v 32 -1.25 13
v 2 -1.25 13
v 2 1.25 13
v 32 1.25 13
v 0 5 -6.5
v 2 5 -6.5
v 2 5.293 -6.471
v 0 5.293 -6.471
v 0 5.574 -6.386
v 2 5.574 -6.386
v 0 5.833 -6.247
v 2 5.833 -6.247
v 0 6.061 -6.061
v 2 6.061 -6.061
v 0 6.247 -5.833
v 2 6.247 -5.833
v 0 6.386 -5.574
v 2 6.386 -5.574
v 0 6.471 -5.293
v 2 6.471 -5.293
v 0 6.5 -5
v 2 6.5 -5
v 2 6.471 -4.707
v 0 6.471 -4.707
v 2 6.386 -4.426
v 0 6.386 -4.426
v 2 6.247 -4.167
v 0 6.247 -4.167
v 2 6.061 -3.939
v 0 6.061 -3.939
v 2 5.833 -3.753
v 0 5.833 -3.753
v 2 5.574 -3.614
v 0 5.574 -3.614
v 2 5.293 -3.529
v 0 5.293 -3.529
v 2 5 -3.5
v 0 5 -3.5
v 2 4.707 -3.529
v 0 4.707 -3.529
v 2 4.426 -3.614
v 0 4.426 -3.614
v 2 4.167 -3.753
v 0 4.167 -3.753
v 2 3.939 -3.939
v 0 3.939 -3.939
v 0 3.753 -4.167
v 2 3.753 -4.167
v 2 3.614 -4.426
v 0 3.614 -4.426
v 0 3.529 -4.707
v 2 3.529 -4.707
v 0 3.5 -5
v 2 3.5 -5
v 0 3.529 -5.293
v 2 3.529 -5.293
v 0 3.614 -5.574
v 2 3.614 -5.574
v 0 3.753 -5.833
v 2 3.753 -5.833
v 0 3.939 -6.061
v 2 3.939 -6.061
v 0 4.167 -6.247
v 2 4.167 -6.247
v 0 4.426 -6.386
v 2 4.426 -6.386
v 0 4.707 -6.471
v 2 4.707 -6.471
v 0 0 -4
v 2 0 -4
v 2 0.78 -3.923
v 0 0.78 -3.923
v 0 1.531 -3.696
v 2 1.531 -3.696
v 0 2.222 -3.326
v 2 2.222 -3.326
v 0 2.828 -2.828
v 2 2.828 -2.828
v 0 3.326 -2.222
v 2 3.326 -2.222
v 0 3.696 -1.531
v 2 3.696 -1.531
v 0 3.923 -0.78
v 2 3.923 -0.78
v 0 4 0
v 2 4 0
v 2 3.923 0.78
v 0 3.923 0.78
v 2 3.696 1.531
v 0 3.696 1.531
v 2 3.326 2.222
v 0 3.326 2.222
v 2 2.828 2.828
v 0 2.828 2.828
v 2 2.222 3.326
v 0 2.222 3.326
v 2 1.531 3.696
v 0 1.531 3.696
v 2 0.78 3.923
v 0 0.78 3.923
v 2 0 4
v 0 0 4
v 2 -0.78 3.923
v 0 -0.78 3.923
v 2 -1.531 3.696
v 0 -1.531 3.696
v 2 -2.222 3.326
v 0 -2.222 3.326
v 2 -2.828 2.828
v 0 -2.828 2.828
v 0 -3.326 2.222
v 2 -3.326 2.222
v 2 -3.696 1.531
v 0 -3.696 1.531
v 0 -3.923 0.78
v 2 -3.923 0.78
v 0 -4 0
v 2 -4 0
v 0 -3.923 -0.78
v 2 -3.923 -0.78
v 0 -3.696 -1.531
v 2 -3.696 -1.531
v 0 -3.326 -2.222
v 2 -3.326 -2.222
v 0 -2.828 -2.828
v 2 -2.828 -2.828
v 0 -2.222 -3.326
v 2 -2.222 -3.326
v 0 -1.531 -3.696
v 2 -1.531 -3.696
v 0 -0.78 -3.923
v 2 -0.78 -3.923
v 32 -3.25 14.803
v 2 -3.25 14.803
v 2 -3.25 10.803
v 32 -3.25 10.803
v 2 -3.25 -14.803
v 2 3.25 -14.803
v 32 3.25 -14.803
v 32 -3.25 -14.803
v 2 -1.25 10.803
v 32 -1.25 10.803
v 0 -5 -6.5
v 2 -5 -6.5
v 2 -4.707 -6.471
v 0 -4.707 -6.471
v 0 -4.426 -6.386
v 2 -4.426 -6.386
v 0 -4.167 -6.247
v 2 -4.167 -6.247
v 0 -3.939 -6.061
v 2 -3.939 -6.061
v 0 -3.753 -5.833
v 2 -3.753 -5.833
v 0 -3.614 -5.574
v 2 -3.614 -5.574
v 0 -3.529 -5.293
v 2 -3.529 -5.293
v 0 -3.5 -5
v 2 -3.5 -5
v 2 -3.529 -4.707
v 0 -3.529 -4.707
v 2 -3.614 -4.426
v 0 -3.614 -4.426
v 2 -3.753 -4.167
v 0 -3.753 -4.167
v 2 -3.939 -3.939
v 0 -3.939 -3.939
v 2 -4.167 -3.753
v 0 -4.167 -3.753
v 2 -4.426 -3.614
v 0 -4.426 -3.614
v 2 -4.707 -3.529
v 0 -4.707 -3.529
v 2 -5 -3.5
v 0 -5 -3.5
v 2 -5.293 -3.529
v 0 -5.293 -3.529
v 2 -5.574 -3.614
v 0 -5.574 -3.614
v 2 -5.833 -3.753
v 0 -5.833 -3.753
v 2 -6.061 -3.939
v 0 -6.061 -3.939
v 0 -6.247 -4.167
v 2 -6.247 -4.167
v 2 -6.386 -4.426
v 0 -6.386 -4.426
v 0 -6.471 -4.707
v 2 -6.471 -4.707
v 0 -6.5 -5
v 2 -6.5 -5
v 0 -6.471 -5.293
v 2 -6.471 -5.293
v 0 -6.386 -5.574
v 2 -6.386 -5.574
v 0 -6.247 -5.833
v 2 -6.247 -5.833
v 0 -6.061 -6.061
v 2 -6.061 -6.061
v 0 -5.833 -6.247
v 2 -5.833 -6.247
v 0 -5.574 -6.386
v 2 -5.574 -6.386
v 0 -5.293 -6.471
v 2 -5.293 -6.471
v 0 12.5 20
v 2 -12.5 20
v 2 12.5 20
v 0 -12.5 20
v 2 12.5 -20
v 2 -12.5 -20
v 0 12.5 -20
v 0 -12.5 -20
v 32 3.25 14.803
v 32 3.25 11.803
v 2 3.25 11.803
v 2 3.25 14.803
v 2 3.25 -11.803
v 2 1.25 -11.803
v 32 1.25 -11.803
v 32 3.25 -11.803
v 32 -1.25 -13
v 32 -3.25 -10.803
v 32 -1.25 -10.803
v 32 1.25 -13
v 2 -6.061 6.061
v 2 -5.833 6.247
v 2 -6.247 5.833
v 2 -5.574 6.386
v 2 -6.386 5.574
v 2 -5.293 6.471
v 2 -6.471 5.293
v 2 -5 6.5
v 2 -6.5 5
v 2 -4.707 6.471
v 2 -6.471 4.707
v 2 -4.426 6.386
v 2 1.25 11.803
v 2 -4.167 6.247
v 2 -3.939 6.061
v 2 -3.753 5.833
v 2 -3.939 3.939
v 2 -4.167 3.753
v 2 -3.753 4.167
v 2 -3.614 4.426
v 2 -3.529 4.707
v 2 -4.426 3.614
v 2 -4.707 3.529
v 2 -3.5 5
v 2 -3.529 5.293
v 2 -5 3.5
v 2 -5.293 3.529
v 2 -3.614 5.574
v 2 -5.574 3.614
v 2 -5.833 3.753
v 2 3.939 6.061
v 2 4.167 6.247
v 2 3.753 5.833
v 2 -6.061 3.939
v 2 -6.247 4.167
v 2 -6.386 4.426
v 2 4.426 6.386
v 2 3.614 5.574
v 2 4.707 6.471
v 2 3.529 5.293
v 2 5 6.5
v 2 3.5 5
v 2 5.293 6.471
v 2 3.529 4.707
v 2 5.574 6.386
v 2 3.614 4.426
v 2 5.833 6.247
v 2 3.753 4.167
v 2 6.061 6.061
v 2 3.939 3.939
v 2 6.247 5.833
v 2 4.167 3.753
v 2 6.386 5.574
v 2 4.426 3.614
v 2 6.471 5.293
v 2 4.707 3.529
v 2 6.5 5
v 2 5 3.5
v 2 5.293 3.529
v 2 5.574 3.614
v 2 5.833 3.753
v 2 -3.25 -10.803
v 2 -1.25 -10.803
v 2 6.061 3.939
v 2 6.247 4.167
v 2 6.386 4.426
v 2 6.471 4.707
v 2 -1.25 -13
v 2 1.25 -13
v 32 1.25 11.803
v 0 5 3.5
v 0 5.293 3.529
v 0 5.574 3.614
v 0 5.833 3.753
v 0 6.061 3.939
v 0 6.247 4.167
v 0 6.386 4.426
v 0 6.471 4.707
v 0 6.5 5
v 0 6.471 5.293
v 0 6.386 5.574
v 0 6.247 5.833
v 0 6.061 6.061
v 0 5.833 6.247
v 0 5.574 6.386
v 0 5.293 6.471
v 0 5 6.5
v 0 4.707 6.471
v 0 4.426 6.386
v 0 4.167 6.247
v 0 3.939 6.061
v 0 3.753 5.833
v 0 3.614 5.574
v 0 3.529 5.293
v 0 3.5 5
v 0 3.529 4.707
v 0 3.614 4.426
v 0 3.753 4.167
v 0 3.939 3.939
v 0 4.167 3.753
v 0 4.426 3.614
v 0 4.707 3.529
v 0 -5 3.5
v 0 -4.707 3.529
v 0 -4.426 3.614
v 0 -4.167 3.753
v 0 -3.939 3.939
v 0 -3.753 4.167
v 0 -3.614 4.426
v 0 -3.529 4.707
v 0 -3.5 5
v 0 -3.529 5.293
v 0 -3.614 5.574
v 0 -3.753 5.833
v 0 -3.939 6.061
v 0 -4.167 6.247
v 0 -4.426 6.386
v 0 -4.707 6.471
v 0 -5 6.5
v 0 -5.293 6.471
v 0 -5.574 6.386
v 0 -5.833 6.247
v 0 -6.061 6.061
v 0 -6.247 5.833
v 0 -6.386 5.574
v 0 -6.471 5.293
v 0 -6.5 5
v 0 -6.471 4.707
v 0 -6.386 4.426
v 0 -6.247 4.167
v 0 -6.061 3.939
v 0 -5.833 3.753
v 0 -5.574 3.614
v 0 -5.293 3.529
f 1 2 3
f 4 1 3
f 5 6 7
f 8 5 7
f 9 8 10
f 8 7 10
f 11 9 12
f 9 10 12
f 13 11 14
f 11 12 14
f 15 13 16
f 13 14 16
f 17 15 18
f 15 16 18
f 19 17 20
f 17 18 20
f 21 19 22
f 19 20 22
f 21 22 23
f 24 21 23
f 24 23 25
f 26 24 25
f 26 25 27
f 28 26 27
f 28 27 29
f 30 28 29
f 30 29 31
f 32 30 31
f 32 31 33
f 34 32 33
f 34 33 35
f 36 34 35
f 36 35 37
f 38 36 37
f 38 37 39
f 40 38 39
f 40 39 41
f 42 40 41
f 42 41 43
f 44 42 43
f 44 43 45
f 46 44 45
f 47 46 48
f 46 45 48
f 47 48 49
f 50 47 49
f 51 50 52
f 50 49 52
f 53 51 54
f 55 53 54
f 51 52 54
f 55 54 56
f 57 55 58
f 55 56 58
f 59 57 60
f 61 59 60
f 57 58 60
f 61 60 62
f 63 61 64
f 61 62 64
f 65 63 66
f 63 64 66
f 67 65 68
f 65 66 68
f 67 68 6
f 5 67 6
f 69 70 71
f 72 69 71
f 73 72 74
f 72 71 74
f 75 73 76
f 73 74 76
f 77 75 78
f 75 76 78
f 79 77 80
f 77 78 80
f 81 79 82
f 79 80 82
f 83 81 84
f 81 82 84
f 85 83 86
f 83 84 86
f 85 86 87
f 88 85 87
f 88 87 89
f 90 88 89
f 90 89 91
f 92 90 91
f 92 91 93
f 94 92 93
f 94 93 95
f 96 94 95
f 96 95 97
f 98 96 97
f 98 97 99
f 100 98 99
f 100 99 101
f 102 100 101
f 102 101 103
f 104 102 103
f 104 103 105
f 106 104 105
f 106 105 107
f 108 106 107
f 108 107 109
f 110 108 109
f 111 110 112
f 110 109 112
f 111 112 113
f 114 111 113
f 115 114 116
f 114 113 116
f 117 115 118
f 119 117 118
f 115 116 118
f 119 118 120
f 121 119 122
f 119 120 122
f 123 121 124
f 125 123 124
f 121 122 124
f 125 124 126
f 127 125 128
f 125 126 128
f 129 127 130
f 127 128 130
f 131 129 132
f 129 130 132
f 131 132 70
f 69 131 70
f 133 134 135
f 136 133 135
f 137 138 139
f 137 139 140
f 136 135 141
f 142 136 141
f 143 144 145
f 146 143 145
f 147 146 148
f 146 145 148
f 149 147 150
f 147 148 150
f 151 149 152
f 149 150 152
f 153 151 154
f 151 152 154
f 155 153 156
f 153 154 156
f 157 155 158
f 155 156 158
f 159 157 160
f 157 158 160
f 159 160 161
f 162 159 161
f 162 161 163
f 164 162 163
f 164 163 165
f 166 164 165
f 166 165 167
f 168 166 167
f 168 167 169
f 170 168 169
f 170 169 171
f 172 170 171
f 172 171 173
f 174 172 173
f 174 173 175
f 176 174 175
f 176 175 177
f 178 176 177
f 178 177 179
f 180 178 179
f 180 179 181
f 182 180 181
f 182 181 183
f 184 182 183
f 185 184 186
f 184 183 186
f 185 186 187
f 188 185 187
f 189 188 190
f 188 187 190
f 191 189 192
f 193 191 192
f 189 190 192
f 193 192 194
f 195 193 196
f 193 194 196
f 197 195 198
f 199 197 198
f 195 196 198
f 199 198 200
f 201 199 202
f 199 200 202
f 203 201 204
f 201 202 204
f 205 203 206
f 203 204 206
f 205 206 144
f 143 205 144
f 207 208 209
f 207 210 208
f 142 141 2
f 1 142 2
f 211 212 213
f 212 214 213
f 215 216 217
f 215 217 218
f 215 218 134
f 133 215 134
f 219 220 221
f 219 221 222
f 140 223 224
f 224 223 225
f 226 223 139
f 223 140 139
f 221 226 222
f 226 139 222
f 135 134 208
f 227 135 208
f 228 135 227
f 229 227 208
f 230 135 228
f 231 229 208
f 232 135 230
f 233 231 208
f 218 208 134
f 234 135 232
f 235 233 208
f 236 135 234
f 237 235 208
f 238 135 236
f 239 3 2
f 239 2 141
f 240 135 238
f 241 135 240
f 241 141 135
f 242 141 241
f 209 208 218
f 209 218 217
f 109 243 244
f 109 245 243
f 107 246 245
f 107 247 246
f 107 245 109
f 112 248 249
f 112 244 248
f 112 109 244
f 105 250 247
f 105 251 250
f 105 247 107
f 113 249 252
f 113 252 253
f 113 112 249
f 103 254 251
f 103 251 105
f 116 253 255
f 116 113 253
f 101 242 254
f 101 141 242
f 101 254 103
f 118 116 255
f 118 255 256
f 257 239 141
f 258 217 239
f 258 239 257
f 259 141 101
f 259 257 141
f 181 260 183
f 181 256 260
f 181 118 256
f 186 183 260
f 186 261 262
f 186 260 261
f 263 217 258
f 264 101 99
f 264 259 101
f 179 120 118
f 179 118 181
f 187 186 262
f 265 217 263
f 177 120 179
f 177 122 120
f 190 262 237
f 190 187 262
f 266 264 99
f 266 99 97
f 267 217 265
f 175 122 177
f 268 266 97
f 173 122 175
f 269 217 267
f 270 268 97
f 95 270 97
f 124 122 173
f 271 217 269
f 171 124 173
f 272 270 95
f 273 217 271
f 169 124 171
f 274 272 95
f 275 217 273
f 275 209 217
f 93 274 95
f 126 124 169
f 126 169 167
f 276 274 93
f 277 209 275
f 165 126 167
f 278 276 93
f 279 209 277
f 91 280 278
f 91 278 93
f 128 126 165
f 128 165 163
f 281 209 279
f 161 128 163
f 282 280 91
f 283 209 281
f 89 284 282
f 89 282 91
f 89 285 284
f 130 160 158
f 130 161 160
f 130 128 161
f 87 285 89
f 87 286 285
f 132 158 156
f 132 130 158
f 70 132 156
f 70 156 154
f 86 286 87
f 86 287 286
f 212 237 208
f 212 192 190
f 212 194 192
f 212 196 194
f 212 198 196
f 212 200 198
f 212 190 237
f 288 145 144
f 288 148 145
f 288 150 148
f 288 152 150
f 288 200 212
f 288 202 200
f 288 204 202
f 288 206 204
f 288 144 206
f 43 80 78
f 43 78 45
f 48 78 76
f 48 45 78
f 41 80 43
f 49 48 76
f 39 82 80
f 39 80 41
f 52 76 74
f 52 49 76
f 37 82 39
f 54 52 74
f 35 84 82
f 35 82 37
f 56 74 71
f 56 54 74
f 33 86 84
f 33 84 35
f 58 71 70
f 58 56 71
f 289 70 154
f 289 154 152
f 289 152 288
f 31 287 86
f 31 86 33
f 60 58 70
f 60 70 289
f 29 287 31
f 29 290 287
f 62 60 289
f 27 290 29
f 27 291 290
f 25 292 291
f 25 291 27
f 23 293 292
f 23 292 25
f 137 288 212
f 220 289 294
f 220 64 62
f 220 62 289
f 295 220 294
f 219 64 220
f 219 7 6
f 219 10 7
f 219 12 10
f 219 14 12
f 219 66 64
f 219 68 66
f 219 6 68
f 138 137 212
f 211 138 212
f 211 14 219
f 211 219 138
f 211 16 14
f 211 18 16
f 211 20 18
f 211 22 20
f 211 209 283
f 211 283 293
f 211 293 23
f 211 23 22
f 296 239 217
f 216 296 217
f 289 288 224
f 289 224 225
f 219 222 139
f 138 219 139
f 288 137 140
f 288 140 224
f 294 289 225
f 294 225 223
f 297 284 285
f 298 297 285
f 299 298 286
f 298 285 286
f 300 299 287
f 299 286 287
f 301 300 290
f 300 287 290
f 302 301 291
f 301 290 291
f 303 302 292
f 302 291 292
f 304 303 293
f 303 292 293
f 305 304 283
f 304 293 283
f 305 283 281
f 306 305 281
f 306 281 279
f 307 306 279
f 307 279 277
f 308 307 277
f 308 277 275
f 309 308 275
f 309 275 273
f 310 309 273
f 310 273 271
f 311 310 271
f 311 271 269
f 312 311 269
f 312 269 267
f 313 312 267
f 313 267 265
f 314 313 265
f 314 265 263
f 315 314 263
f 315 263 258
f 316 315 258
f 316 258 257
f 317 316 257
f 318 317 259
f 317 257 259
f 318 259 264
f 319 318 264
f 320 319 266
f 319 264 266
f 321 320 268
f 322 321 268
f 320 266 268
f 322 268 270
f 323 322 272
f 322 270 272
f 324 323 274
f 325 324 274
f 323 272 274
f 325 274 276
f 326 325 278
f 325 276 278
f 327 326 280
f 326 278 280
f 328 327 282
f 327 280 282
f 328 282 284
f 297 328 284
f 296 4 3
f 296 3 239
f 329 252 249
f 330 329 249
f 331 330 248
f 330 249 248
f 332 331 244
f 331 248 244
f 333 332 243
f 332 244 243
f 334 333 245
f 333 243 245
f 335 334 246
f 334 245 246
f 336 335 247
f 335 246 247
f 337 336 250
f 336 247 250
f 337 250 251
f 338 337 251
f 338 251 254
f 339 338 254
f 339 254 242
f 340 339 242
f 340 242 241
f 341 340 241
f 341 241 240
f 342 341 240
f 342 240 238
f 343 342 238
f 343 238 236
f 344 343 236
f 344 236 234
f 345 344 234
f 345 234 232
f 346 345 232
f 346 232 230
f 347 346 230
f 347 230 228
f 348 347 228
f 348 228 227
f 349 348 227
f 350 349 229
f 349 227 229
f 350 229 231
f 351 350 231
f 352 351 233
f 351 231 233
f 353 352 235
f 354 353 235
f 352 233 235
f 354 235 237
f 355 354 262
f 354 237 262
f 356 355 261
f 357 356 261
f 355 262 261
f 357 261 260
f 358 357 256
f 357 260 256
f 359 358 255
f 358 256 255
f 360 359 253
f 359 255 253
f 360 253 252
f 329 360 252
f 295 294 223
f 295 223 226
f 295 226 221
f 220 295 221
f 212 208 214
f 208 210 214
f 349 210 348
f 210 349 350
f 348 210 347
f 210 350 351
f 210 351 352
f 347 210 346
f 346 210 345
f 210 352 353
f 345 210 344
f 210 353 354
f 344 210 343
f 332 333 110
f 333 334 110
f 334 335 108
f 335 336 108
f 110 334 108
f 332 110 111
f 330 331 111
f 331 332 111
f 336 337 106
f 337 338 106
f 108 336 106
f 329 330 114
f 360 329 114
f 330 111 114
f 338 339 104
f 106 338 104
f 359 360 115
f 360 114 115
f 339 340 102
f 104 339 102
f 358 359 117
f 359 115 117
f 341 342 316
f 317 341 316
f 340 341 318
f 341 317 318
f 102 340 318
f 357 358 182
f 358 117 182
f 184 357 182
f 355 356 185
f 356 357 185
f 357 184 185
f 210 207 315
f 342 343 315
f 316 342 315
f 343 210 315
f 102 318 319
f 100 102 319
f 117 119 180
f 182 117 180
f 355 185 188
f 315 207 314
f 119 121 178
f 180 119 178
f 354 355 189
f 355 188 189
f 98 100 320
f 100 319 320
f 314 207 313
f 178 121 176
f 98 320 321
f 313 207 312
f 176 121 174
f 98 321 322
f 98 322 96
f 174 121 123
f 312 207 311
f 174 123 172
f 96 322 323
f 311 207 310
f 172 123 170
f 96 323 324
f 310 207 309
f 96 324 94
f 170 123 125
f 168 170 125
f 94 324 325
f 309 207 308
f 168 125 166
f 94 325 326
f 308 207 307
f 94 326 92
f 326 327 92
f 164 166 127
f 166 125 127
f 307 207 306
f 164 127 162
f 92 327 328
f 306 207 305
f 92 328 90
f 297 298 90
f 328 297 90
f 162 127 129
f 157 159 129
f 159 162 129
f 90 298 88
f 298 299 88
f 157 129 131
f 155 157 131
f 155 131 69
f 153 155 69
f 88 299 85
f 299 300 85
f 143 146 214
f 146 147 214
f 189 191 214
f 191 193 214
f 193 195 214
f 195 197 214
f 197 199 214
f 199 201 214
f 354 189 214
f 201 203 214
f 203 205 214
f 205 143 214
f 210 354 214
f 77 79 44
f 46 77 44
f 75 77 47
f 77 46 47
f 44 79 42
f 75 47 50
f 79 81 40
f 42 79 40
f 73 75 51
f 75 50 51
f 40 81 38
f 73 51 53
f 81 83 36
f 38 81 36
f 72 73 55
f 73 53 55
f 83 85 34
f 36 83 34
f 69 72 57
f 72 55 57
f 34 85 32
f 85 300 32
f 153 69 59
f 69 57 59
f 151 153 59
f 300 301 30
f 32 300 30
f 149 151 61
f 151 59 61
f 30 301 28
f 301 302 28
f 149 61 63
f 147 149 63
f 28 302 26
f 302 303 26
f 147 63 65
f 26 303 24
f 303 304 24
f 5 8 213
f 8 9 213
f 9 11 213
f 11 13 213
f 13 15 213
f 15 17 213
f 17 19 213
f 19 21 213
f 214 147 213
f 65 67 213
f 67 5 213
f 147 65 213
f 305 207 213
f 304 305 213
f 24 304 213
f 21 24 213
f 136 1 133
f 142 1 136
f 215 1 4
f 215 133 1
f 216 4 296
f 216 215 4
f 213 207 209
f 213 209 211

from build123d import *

# Parameters (mm, degrees)
SKETCH1_W           = 40
SKETCH1_H           = 25
BOSS_EXTRUDE1_DEPTH = 1
SKETCH2_W           = 40
SKETCH2_H           = 25
BOSS_EXTRUDE2_DEPTH = 1
BOSS_EXTRUDE3_DEPTH = 30
SKETCH5_R           = 1.5
SKETCH5_R_2         = 4
CUT_EXTRUDE2_DEPTH  = 10


with BuildPart() as part:
    # Sketch1 → Boss-Extrude1 (new body)
    with BuildSketch(Plane(origin=(0, 0, 0), x_dir=(0, 0, -1), z_dir=(1, 0, 0))):
        Rectangle(SKETCH1_W, SKETCH1_H)
    extrude(amount=BOSS_EXTRUDE1_DEPTH)

    # Sketch2 → Boss-Extrude2 (add)
    with BuildSketch(Plane(origin=(1, 0, 0), x_dir=(0, 0, -1), z_dir=(1, 0, 0))):
        Rectangle(SKETCH2_W, SKETCH2_H)
    extrude(amount=BOSS_EXTRUDE2_DEPTH)

    # Sketch3 → Boss-Extrude3 (add)
    with BuildSketch(Plane(origin=(2, 0, 0), x_dir=(0, 0, -1), z_dir=(1, 0, 0))):
        Polygon((11.802707793, 1.25), (11.802707793, 3.25), (14.802707793, 3.25), (14.802707793, -3.25), (10.802707793, -3.25), (10.802707793, -1.25), (13, -1.25), (13, 1.25), align=None)
        Polygon((-13, -1.25), (-13, 1.25), (-11.802707793, 1.25), (-11.802707793, 3.25), (-14.802707793, 3.25), (-14.802707793, -3.25), (-10.802707793, -3.25), (-10.802707793, -1.25), align=None)
    extrude(amount=BOSS_EXTRUDE3_DEPTH)

    # Sketch5 → Cut-Extrude2 (cut)
    with BuildSketch(Plane(origin=(2, 0, 0), x_dir=(0, 0, -1), z_dir=(1, 0, 0))):
        with Locations((5, 5)):
            Circle(SKETCH5_R)
        with Locations((5, -5)):
            Circle(SKETCH5_R)
        with Locations((-5, -5)):
            Circle(SKETCH5_R)
        with Locations((-5, 5)):
            Circle(SKETCH5_R)
        Circle(SKETCH5_R_2)
    extrude(amount=-CUT_EXTRUDE2_DEPTH, mode=Mode.SUBTRACT)


solid = part.part
